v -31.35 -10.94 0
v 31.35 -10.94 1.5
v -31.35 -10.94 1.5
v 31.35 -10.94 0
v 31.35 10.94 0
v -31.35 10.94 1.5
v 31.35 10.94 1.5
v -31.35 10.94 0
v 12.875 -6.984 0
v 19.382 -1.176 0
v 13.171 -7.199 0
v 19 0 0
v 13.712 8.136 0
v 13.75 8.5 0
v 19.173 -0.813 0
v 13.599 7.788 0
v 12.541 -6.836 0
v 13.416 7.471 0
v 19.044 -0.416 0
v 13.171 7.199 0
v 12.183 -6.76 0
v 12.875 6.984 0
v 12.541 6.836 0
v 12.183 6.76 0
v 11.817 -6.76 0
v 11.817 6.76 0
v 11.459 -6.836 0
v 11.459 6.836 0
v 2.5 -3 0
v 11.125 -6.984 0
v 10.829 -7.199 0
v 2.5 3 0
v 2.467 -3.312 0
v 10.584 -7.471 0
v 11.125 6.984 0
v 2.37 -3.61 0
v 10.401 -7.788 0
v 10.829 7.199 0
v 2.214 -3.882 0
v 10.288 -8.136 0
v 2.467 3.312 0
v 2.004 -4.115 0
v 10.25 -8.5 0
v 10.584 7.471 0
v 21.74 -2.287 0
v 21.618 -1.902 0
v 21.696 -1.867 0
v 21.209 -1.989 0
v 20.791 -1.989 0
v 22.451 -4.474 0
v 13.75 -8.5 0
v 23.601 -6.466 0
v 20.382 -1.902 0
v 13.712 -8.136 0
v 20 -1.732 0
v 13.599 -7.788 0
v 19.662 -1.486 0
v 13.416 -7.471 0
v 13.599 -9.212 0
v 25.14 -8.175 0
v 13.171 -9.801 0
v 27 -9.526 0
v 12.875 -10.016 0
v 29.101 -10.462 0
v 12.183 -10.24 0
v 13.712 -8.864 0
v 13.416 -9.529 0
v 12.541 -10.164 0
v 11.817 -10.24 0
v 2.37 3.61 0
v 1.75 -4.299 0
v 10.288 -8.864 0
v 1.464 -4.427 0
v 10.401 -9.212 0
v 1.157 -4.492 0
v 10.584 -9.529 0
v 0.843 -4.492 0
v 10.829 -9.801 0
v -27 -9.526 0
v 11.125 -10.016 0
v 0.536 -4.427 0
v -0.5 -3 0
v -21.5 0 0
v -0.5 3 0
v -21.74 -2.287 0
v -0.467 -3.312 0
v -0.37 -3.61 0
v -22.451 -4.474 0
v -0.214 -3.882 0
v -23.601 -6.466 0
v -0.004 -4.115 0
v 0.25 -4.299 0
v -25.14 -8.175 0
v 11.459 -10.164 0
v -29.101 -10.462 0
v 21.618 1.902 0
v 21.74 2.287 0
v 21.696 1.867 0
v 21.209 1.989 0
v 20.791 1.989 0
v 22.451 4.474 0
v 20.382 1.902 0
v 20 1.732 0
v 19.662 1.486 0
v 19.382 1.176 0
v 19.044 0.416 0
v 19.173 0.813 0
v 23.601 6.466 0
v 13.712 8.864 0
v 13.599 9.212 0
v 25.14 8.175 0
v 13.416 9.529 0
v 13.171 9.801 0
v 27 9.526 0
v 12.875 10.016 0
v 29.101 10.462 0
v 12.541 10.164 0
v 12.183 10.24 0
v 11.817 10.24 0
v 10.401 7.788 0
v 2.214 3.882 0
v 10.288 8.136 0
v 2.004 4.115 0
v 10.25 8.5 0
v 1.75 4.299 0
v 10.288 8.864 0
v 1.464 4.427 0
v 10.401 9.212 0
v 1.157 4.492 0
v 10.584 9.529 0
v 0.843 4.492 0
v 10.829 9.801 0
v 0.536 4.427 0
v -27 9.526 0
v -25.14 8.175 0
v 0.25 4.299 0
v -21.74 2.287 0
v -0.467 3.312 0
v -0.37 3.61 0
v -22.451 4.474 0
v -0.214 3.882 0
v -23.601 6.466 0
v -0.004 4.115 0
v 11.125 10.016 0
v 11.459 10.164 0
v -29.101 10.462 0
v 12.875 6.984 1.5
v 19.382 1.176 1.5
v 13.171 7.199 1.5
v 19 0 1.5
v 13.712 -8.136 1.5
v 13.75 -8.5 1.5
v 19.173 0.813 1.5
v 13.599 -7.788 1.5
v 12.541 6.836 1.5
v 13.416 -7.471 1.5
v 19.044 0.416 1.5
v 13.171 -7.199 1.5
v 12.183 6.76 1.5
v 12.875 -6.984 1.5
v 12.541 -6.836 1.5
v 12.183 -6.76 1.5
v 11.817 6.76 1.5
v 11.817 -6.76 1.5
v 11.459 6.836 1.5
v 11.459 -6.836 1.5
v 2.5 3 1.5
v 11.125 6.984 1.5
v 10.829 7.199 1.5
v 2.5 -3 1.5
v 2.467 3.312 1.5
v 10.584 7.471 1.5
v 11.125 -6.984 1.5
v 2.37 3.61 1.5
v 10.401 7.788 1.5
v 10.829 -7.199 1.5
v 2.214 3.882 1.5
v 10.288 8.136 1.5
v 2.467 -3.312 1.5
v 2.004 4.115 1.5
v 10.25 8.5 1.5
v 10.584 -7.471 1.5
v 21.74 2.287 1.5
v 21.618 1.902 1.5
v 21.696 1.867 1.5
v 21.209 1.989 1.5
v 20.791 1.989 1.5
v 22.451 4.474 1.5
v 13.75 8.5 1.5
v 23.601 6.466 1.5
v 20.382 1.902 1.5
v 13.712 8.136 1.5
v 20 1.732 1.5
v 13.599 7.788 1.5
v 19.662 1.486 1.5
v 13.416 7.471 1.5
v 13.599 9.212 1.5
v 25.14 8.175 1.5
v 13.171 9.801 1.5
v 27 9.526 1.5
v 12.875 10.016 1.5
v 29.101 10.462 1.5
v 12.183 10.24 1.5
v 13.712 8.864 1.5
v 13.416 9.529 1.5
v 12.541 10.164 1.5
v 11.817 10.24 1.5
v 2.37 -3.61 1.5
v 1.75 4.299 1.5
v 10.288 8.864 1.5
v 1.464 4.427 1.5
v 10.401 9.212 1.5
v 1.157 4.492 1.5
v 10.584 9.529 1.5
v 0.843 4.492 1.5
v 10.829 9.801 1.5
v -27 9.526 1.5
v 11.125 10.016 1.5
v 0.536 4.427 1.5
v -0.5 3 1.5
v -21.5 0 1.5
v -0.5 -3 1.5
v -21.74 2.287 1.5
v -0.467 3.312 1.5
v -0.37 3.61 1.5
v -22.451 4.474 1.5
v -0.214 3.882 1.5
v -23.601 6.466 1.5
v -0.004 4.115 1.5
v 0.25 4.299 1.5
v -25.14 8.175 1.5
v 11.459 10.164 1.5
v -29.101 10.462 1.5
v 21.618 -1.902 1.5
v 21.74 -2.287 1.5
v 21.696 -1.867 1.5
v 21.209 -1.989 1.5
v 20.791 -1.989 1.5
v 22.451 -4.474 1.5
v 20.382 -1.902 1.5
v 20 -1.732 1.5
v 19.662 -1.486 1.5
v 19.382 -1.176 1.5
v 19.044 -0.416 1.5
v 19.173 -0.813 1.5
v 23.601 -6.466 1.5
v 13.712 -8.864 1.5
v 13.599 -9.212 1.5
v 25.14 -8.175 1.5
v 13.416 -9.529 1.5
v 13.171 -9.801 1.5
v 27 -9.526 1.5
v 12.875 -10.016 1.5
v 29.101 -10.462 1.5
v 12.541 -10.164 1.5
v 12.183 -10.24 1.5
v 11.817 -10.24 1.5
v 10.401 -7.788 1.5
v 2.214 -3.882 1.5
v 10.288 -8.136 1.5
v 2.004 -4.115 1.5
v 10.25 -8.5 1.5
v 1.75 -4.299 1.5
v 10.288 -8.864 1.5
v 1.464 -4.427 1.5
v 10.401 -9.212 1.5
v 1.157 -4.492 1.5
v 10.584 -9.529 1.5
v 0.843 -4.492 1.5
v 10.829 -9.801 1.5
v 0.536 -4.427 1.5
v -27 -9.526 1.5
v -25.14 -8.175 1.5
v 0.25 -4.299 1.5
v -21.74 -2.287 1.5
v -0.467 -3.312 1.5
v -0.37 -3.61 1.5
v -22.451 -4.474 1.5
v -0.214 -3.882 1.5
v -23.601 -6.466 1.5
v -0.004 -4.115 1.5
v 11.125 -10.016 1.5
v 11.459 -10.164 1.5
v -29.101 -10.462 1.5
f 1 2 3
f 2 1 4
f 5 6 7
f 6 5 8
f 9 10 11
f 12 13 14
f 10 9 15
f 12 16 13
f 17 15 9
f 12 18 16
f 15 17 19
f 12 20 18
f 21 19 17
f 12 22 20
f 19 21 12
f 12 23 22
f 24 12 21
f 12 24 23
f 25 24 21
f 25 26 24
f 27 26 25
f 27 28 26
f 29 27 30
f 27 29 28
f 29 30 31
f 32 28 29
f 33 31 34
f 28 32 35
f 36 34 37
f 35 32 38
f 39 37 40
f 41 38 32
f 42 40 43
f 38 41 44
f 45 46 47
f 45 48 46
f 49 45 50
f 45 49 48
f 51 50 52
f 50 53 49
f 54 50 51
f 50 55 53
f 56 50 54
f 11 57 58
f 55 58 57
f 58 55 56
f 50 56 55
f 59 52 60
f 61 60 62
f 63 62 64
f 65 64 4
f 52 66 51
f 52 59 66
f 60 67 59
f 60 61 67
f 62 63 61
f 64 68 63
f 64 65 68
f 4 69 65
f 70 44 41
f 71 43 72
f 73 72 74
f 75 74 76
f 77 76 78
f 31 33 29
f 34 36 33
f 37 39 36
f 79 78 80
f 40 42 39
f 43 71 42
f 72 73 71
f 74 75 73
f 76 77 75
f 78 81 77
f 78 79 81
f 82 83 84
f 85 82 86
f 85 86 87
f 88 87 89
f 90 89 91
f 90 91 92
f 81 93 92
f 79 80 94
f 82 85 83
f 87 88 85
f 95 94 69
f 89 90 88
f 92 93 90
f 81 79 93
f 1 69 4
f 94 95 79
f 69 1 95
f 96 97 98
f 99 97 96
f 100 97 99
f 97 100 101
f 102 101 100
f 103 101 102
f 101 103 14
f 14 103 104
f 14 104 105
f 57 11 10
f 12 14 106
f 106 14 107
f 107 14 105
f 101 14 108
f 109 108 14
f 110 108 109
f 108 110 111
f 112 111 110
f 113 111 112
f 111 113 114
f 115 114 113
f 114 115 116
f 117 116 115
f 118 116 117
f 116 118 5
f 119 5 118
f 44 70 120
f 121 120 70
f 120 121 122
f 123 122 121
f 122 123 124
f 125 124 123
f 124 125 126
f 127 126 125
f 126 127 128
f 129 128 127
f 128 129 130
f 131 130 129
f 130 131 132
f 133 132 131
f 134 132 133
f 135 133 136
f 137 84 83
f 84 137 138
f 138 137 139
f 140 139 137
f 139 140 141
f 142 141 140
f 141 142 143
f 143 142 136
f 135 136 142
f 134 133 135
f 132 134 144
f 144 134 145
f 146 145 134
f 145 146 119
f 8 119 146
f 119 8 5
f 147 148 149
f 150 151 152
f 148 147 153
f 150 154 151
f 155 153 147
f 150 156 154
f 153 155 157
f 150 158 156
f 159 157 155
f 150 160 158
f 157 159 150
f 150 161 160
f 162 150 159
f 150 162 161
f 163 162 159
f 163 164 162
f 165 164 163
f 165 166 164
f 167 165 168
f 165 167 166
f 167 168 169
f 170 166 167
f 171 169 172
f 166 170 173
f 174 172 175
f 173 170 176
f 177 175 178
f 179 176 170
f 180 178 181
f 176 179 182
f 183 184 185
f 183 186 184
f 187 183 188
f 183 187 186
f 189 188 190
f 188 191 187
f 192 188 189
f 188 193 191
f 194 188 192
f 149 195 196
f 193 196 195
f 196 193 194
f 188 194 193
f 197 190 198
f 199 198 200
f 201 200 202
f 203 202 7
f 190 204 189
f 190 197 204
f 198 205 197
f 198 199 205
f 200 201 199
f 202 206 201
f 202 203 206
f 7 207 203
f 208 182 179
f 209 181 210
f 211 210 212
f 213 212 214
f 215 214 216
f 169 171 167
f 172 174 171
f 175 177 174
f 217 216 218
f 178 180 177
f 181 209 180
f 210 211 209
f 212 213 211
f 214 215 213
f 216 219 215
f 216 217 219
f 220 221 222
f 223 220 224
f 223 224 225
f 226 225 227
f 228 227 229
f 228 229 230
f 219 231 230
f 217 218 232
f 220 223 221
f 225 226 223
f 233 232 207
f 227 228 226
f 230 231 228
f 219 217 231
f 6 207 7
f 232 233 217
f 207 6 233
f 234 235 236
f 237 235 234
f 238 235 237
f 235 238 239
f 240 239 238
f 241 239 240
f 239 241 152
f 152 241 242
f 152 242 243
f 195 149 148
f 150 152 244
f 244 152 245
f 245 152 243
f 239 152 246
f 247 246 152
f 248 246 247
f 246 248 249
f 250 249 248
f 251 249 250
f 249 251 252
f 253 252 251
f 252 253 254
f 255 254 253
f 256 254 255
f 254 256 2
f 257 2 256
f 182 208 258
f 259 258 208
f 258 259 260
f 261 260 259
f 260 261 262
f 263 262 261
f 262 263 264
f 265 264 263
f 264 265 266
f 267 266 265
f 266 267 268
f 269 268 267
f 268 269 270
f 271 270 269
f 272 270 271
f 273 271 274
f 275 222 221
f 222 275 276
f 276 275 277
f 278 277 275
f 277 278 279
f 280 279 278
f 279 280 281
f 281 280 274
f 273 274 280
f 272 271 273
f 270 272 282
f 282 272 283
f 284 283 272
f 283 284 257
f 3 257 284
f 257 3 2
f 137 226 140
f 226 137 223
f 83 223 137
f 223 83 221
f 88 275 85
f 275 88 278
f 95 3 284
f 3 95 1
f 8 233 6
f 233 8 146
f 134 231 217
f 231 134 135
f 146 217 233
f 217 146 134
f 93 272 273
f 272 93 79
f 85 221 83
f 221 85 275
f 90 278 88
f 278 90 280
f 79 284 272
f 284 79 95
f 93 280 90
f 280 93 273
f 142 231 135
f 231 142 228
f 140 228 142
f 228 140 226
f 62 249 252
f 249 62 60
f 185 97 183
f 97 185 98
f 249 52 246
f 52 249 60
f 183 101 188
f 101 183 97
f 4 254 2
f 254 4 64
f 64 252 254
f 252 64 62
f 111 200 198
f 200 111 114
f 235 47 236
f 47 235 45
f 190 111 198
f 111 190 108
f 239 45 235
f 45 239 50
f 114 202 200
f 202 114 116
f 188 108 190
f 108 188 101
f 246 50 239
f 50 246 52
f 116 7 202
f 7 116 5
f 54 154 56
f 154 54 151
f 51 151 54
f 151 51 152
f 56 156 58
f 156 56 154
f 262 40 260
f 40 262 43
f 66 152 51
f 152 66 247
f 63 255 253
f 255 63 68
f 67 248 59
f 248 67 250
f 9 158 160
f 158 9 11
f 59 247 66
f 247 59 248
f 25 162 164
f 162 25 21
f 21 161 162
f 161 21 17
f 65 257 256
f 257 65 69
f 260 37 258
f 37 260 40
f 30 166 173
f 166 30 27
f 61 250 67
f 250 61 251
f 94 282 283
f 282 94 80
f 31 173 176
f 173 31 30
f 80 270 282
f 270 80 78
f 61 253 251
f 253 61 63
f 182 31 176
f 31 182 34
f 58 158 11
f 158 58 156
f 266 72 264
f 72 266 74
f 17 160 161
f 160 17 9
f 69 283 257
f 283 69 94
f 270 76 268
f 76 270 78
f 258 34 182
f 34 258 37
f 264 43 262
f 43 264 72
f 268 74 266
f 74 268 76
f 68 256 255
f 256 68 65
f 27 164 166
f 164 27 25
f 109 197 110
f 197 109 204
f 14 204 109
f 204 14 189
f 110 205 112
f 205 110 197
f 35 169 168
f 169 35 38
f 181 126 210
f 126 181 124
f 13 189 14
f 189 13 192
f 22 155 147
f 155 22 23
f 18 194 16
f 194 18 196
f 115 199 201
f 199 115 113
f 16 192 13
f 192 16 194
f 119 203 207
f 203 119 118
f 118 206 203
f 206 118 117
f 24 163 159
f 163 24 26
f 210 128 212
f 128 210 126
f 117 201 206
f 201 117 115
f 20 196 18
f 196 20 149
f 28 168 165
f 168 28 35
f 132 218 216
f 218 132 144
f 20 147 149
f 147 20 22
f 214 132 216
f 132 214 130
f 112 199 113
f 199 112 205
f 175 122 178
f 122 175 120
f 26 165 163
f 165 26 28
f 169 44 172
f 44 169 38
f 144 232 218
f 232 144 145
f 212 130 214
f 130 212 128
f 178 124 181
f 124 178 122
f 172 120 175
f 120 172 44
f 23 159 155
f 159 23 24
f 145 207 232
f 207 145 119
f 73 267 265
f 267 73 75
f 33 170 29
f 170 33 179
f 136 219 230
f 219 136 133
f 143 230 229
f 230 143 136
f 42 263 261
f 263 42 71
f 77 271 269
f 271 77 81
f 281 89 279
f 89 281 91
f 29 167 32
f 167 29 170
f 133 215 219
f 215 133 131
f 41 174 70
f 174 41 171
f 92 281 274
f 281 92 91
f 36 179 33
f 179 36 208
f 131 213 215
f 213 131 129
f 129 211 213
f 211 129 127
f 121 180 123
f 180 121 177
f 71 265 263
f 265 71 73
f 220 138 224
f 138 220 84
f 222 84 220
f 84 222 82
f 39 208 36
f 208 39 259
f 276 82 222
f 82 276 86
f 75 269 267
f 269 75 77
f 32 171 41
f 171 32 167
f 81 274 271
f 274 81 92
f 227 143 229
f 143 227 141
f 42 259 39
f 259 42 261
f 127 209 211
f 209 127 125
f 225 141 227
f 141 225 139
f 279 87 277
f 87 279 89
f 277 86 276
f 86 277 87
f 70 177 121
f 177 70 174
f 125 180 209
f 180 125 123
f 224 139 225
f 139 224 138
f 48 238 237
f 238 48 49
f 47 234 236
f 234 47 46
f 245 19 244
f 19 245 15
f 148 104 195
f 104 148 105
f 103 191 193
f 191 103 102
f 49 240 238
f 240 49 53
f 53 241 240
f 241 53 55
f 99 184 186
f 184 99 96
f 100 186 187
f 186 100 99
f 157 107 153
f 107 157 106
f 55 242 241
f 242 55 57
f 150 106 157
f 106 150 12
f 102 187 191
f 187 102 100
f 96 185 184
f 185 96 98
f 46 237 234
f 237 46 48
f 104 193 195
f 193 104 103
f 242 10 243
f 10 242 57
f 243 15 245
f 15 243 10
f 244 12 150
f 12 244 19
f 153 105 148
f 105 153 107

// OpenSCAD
LENGTH = 65;
WIDTH = 22;
THICKNESS = 1.5;

WHEEL_HOLE_DIA = WIDTH;

MOUNT_HOLE_DIA = 3.5;
MOUNT_HOLE_SPACING = 17;
MOUNT_HOLE_OFFSET = 12;

SLOT_LENGTH = 6;
SLOT_WIDTH = 3;
SLOT_OFFSET = 1;

HOLE_OFFSET = 21;
HOLE_DIA = 4;

$fn = 30;

module panel() {
  difference() {
    hull() {
      translate([-LENGTH/2, 0, 0])
      cylinder(d = WIDTH, h = THICKNESS);
      translate([LENGTH/2, 0, 0])
      cylinder(d = WIDTH, h = THICKNESS);
    }
    
    translate([-LENGTH/2, 0, 0])
    cylinder(d = WHEEL_HOLE_DIA, h = THICKNESS);
    translate([LENGTH/2, 0, 0])
    cylinder(d = WHEEL_HOLE_DIA, h = THICKNESS);

    translate([MOUNT_HOLE_OFFSET, -MOUNT_HOLE_SPACING/2, 0])
    cylinder(d = MOUNT_HOLE_DIA, h = THICKNESS);
    translate([MOUNT_HOLE_OFFSET, MOUNT_HOLE_SPACING/2, 0])
    cylinder(d = MOUNT_HOLE_DIA, h = THICKNESS);
    
    hull() {
      translate([SLOT_OFFSET, -SLOT_LENGTH/2, 0])
      cylinder(d = SLOT_WIDTH, h = THICKNESS);
      translate([SLOT_OFFSET, SLOT_LENGTH/2, 0])
      cylinder(d = SLOT_WIDTH, h = THICKNESS);
    }
    
    translate([HOLE_OFFSET, 0, 0])
    cylinder(d = HOLE_DIA, h = THICKNESS);
  }
}

panel();
